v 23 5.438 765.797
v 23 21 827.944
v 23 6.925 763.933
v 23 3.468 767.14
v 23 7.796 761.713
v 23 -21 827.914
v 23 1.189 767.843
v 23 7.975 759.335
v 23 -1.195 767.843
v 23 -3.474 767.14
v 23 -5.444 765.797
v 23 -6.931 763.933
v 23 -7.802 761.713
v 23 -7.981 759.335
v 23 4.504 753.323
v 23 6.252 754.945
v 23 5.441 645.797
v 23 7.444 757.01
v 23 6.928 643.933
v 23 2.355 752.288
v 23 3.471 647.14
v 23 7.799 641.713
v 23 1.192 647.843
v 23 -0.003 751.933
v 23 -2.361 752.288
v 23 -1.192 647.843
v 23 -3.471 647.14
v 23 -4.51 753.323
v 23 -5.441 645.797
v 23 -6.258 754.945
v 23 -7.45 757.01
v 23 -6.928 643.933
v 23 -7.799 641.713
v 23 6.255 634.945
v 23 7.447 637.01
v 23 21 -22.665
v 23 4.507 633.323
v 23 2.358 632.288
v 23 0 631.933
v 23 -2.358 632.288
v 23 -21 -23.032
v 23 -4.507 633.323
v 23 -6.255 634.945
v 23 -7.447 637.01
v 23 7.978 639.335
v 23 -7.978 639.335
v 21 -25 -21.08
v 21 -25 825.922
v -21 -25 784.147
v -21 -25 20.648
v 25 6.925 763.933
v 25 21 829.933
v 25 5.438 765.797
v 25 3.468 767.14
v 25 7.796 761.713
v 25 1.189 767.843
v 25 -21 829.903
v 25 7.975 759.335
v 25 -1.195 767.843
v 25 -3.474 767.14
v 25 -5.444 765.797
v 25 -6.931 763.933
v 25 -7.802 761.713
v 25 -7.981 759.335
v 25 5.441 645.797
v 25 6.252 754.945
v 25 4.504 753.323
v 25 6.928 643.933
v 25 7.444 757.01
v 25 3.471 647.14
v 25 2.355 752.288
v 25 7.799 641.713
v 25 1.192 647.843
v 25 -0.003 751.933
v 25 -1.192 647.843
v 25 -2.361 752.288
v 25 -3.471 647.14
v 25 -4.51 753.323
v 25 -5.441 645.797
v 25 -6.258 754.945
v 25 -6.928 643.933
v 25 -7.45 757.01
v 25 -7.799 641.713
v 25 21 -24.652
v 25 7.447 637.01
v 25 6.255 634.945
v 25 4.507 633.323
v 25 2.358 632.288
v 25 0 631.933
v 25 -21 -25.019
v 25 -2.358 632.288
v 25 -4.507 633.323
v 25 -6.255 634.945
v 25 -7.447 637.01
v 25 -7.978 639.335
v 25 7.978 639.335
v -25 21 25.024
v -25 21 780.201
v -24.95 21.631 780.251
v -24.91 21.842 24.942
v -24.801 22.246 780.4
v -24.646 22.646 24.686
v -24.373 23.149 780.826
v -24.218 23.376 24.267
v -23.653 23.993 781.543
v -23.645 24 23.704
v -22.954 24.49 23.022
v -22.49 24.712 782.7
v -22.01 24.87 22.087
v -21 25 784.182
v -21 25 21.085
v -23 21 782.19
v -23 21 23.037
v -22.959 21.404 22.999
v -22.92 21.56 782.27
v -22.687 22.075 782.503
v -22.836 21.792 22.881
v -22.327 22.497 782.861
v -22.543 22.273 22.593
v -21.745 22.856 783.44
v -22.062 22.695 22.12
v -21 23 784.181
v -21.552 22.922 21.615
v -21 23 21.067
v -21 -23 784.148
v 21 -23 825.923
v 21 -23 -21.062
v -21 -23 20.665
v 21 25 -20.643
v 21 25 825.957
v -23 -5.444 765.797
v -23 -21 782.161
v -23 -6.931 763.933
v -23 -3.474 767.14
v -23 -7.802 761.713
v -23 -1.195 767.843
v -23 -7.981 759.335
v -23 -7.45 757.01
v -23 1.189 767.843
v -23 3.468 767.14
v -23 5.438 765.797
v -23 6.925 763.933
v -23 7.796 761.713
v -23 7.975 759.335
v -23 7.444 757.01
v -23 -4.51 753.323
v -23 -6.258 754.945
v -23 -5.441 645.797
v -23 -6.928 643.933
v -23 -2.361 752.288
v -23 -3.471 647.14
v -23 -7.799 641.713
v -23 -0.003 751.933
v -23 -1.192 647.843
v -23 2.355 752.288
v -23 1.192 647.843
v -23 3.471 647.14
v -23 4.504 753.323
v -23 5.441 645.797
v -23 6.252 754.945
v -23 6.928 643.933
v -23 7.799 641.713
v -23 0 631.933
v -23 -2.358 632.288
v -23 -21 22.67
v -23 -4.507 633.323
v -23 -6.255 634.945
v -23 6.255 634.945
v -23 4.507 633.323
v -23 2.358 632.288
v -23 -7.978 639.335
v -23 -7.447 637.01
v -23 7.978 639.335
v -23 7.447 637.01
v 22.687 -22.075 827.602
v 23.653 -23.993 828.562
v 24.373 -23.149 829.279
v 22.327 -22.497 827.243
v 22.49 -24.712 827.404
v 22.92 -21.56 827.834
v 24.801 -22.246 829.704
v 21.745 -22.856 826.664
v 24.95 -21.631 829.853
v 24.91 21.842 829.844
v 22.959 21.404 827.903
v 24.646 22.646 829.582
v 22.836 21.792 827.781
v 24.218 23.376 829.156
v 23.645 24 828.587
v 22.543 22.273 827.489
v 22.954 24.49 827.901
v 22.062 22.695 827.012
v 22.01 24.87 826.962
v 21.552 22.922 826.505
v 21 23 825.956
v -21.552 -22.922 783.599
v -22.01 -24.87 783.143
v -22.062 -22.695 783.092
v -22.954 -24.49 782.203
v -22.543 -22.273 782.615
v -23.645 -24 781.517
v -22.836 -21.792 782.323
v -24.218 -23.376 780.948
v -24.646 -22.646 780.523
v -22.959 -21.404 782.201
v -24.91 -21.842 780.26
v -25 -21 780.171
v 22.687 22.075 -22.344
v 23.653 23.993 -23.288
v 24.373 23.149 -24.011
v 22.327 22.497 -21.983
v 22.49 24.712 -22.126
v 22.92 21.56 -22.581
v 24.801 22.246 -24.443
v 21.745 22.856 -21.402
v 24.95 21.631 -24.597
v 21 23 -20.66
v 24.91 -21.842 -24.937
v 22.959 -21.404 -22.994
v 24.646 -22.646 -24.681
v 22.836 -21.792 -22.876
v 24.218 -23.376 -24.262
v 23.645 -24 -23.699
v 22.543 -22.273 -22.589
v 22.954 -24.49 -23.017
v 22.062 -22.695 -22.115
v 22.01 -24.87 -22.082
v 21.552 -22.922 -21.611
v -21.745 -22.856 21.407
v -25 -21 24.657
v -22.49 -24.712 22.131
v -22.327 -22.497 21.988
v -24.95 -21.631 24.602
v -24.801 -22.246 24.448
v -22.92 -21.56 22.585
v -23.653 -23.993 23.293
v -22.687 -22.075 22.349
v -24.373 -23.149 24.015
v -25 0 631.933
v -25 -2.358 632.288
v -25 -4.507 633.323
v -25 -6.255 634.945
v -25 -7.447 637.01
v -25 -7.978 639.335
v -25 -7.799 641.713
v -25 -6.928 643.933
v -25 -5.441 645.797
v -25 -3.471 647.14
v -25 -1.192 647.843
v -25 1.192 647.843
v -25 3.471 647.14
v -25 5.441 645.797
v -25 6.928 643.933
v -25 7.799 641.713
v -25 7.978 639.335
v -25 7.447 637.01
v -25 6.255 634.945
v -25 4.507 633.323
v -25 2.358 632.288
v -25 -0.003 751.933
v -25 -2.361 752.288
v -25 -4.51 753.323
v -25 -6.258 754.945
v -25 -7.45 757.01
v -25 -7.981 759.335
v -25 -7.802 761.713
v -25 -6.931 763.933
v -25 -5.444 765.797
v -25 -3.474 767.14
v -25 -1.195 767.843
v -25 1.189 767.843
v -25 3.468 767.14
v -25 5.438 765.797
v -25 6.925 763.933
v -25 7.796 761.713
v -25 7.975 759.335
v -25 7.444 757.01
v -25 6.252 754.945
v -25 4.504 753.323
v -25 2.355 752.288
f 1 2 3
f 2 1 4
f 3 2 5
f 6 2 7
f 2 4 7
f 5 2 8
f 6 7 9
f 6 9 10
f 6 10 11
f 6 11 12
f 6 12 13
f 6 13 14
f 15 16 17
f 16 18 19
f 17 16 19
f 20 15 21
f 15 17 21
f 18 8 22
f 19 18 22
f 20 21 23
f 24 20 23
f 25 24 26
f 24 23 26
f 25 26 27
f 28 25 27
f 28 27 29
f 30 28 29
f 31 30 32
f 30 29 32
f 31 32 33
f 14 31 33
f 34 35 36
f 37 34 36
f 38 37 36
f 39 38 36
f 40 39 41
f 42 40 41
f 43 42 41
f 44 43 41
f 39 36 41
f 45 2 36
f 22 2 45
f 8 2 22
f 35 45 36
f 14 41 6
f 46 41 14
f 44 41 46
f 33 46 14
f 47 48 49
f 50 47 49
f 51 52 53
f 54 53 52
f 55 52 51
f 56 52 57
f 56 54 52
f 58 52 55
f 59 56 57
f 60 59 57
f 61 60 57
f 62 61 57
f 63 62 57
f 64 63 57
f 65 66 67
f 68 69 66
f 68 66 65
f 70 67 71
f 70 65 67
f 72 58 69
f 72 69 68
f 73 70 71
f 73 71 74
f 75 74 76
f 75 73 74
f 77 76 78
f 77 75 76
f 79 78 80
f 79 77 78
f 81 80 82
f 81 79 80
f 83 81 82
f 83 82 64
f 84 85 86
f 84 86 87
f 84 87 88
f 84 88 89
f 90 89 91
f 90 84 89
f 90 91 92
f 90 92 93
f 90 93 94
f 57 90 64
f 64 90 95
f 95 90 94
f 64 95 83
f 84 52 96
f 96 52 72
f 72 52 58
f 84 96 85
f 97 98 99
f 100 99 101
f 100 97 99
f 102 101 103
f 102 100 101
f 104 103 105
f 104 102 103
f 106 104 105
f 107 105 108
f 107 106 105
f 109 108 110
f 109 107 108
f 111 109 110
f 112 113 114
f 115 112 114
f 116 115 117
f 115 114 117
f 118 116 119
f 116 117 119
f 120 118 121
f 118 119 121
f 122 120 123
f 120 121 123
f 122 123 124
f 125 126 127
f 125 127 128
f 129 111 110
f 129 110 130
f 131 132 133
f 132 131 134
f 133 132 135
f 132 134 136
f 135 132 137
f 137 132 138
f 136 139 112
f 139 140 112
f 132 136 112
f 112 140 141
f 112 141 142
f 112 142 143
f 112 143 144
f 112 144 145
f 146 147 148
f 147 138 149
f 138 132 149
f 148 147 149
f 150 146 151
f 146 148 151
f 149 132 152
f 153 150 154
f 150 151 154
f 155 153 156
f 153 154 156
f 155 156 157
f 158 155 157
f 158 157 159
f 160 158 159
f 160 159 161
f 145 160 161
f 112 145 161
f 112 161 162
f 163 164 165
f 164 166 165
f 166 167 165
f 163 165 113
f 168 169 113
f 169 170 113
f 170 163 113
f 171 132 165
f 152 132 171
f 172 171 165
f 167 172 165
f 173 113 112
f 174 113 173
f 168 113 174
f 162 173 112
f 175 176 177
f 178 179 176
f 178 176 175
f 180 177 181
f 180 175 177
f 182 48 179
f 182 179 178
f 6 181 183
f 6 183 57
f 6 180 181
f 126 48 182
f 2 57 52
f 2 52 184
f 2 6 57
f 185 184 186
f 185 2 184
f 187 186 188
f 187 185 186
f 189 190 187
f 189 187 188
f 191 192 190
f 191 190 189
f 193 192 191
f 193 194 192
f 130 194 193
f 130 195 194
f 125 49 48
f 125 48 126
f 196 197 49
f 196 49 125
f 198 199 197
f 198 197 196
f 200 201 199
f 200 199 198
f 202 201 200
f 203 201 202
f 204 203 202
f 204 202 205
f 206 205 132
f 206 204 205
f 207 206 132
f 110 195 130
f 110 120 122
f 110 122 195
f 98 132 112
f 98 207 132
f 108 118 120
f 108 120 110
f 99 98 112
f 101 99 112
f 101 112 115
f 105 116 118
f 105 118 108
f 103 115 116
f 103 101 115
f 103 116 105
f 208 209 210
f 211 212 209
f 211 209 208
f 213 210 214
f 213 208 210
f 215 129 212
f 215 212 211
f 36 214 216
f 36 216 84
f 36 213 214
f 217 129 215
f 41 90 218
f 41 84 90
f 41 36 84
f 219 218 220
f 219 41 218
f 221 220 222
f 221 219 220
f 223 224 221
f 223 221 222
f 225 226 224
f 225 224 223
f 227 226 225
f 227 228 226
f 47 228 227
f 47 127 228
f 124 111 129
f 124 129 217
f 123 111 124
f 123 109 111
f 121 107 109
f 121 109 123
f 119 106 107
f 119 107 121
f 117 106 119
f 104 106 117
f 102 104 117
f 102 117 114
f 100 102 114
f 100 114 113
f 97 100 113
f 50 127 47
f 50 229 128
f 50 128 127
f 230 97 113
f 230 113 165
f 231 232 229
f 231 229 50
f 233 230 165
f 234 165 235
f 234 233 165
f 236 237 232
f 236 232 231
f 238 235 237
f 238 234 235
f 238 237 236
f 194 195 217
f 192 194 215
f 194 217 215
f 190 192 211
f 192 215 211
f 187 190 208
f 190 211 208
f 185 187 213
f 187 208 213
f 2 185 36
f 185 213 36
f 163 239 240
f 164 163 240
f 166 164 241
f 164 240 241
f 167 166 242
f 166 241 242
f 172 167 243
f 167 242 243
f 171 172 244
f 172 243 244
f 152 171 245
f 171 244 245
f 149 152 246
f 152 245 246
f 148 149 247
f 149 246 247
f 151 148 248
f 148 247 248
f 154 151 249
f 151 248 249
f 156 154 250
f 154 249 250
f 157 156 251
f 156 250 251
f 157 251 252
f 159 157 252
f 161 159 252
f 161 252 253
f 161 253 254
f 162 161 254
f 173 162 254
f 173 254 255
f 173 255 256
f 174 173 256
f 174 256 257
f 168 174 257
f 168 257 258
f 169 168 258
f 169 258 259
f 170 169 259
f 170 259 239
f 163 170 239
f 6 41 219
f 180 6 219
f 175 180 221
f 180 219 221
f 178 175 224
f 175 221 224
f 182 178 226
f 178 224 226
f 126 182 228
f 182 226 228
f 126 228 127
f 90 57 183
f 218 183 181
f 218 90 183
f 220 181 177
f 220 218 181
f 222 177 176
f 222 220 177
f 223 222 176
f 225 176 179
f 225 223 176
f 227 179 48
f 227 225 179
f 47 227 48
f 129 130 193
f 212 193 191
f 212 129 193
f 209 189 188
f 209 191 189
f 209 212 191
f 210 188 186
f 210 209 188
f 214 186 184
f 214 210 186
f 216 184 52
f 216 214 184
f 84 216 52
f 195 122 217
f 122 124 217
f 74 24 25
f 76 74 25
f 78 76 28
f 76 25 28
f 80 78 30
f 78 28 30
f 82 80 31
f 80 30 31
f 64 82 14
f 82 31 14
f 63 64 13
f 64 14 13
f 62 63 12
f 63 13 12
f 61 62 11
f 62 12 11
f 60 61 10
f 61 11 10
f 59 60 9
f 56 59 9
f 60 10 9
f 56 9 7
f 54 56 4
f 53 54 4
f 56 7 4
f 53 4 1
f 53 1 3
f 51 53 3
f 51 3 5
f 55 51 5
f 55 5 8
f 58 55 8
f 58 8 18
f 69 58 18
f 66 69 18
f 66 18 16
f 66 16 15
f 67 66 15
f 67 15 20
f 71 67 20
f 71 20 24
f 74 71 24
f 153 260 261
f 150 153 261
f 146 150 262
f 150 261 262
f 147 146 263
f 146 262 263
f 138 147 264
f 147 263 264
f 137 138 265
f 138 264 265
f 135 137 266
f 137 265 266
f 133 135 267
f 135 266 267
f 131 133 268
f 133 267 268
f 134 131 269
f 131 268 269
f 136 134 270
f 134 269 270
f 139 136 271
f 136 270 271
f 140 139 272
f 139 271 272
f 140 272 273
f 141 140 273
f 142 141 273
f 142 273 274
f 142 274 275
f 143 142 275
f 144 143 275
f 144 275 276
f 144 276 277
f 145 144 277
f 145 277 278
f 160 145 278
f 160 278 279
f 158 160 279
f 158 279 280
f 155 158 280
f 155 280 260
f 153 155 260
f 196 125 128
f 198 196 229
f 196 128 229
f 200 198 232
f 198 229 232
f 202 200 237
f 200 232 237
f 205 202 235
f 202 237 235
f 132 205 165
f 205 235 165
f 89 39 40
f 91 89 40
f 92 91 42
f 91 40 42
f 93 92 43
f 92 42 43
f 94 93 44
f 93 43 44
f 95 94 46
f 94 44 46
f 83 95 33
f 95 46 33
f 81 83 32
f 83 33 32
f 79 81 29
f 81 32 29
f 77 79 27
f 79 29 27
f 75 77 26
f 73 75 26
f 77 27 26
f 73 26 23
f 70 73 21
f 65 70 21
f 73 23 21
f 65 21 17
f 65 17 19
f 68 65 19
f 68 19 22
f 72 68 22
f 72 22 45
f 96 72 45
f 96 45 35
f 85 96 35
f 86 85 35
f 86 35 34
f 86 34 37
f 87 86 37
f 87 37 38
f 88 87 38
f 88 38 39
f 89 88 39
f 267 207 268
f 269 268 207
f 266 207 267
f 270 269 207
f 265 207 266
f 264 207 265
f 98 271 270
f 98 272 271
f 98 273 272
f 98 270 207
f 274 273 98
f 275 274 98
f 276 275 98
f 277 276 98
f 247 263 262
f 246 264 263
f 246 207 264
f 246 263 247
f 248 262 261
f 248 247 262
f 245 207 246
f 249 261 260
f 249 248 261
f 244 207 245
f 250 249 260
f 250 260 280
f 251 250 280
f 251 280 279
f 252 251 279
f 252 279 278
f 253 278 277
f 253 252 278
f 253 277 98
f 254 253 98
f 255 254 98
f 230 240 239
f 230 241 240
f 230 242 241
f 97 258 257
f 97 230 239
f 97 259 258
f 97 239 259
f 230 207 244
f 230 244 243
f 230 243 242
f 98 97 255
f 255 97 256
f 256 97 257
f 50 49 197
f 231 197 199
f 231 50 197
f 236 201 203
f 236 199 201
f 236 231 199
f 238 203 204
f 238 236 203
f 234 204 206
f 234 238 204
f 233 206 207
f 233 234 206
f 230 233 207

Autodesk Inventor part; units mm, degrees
ref_plane "Start Plane" through (0, 0, -25.0531) normal (0, 0, 1) x (1, 0, 0)
ref_plane "End Plane" through (0, 0, 829.9354) normal (0, 0, 1) x (1, 0, 0)
sketch "Sketch" plane through (0, 0, 0) normal (0, 0, 1) x (1, 0, 0)
  line L0 (-25, -21) -> (-25, 21)
  line L1 (-21, 25) -> (21, 25)
  line L2 (25, 21) -> (25, -21)
  line L3 (21, -25) -> (-21, -25)
  arc A0 (-25, -21) -> (-21, -25) centre (-21, -21) ccw
  arc A1 (25, 21) -> (21, 25) centre (21, 21) ccw
  arc A2 (-21, 25) -> (-25, 21) centre (-21, 21) ccw
  arc A3 (21, -25) -> (25, -21) centre (21, -21) ccw
  arc A4 (-21, 23) -> (-23, 21) centre (-21, 21) ccw
  line L4 (-21, 23) -> (21, 23)
  arc A5 (23, 21) -> (21, 23) centre (21, 21) ccw
  line L5 (23, 21) -> (23, -21)
  arc A6 (21, -23) -> (23, -21) centre (21, -21) ccw
  line L6 (21, -23) -> (-21, -23)
  arc A7 (-23, -21) -> (-21, -23) centre (-21, -21) ccw
  line L7 (-23, -21) -> (-23, 21)
  line L8 (0, 36.1598) -> (0, -36.1598) construction
  line L9 (-36.1598, 0) -> (36.1598, 0) construction
  dimension "d7" = 4
  dimension "d9" = 50
  dimension "d11" = 50
  dimension "d12" = 2
  dimension "d15" = 25
  dimension "d16" = 25
extrude "Body" add sketch "Sketch" along normal up to surface (854.9885 mm away) from surface at -25.0531
sketch "Sketch3" plane through (0, 0, 0) normal (0, 0, 1) x (1, 0, 0)
  line L0 (0, 0) -> (10, 0)
ref_plane "Work Plane3" through (0, 0, 0) normal (0, -1, 0) x (1, 0, 0)
sketch "Sketch4" plane through (0, 0, 0) normal (0, -1, 0) x (1, 0, 0)
  line L0 (-2, -25.0531) -> (12, -25.0531)
  line L1 (-2, 829.9354) -> (12, 829.9354)
  dimension "d18" = 854.9885
ref_plane "Work Plane4" through (25.0146, 0.0173, 829.9326) normal (-0.7052, -0.0005, 0.709) x (0.709, -0.0002, 0.7052)
split "Split1" plane through (25.0146, 0.0173, 829.9326) removes the side toward (-0.7052, -0.0005, 0.709)
ref_plane "Work Plane5" through (25.1821, -0.2206, -25.0183) normal (-0.7048, 0.0062, -0.7094) x (-0.7093, 0.015, 0.7048)
split "Split2" plane through (25.1821, -0.2206, -25.0183) removes the side toward (-0.7048, 0.0062, -0.7094)
sketch "Sketch5" plane through (25, -21, 829.9036) normal (1, 0, 0) x (0, 0, -1)
  line L0 (-0.029, 42) -> (0, 0) projected
  line L1 (-0.0145, 21) -> (189.971, 21)
  line L2 (1.9604, 42) -> (852.5696, 42) projected
  line L3 (69.971, 42) -> (69.971, -0.006)
  line L4 (806.8722, 42) -> (47.7162, 42) projected
  line L5 (189.971, 42) -> (189.971, -0.0802)
  point P0 (829.9036, 21)
  point P1 (69.971, 20.997)
  dimension "d19" = 70
  dimension "d20" = 120
hole "Hole1" at (25, 0, 639.9326) at (25, -0.003, 759.9326) direction (-1, 0, 0) diameter 16 depth 50
equation "\"d7\" = G_IR"
equation "\"d9\" = G_W"
equation "\"d11\" = G_H"
equation "\"d12\" = G_T"
equation "\"d15\" = 0.5 * d9"
equation "\"d16\" = 0.5 * d11"
equation "\"d3\" = G_L"
equation "\"G_W\" = 50"
equation "\"G_H\" = 50"
equation "\"G_T\" = 2"
equation "\"G_IR\" = 4"
equation "\"G_L\" = d18"
equation "\"G_OFFSET_START\" = 25.05309"
equation "\"G_OFFSET_END\" = 24.88452"
equation "\"d13\" = -G_OFFSET_START"
equation "\"d14\" = G_OFFSET_END + B_L"
equation "\"B_L\" = 805.05086"
properties part number "ISO 10799-2 - 50x50x2 - 854.99"
